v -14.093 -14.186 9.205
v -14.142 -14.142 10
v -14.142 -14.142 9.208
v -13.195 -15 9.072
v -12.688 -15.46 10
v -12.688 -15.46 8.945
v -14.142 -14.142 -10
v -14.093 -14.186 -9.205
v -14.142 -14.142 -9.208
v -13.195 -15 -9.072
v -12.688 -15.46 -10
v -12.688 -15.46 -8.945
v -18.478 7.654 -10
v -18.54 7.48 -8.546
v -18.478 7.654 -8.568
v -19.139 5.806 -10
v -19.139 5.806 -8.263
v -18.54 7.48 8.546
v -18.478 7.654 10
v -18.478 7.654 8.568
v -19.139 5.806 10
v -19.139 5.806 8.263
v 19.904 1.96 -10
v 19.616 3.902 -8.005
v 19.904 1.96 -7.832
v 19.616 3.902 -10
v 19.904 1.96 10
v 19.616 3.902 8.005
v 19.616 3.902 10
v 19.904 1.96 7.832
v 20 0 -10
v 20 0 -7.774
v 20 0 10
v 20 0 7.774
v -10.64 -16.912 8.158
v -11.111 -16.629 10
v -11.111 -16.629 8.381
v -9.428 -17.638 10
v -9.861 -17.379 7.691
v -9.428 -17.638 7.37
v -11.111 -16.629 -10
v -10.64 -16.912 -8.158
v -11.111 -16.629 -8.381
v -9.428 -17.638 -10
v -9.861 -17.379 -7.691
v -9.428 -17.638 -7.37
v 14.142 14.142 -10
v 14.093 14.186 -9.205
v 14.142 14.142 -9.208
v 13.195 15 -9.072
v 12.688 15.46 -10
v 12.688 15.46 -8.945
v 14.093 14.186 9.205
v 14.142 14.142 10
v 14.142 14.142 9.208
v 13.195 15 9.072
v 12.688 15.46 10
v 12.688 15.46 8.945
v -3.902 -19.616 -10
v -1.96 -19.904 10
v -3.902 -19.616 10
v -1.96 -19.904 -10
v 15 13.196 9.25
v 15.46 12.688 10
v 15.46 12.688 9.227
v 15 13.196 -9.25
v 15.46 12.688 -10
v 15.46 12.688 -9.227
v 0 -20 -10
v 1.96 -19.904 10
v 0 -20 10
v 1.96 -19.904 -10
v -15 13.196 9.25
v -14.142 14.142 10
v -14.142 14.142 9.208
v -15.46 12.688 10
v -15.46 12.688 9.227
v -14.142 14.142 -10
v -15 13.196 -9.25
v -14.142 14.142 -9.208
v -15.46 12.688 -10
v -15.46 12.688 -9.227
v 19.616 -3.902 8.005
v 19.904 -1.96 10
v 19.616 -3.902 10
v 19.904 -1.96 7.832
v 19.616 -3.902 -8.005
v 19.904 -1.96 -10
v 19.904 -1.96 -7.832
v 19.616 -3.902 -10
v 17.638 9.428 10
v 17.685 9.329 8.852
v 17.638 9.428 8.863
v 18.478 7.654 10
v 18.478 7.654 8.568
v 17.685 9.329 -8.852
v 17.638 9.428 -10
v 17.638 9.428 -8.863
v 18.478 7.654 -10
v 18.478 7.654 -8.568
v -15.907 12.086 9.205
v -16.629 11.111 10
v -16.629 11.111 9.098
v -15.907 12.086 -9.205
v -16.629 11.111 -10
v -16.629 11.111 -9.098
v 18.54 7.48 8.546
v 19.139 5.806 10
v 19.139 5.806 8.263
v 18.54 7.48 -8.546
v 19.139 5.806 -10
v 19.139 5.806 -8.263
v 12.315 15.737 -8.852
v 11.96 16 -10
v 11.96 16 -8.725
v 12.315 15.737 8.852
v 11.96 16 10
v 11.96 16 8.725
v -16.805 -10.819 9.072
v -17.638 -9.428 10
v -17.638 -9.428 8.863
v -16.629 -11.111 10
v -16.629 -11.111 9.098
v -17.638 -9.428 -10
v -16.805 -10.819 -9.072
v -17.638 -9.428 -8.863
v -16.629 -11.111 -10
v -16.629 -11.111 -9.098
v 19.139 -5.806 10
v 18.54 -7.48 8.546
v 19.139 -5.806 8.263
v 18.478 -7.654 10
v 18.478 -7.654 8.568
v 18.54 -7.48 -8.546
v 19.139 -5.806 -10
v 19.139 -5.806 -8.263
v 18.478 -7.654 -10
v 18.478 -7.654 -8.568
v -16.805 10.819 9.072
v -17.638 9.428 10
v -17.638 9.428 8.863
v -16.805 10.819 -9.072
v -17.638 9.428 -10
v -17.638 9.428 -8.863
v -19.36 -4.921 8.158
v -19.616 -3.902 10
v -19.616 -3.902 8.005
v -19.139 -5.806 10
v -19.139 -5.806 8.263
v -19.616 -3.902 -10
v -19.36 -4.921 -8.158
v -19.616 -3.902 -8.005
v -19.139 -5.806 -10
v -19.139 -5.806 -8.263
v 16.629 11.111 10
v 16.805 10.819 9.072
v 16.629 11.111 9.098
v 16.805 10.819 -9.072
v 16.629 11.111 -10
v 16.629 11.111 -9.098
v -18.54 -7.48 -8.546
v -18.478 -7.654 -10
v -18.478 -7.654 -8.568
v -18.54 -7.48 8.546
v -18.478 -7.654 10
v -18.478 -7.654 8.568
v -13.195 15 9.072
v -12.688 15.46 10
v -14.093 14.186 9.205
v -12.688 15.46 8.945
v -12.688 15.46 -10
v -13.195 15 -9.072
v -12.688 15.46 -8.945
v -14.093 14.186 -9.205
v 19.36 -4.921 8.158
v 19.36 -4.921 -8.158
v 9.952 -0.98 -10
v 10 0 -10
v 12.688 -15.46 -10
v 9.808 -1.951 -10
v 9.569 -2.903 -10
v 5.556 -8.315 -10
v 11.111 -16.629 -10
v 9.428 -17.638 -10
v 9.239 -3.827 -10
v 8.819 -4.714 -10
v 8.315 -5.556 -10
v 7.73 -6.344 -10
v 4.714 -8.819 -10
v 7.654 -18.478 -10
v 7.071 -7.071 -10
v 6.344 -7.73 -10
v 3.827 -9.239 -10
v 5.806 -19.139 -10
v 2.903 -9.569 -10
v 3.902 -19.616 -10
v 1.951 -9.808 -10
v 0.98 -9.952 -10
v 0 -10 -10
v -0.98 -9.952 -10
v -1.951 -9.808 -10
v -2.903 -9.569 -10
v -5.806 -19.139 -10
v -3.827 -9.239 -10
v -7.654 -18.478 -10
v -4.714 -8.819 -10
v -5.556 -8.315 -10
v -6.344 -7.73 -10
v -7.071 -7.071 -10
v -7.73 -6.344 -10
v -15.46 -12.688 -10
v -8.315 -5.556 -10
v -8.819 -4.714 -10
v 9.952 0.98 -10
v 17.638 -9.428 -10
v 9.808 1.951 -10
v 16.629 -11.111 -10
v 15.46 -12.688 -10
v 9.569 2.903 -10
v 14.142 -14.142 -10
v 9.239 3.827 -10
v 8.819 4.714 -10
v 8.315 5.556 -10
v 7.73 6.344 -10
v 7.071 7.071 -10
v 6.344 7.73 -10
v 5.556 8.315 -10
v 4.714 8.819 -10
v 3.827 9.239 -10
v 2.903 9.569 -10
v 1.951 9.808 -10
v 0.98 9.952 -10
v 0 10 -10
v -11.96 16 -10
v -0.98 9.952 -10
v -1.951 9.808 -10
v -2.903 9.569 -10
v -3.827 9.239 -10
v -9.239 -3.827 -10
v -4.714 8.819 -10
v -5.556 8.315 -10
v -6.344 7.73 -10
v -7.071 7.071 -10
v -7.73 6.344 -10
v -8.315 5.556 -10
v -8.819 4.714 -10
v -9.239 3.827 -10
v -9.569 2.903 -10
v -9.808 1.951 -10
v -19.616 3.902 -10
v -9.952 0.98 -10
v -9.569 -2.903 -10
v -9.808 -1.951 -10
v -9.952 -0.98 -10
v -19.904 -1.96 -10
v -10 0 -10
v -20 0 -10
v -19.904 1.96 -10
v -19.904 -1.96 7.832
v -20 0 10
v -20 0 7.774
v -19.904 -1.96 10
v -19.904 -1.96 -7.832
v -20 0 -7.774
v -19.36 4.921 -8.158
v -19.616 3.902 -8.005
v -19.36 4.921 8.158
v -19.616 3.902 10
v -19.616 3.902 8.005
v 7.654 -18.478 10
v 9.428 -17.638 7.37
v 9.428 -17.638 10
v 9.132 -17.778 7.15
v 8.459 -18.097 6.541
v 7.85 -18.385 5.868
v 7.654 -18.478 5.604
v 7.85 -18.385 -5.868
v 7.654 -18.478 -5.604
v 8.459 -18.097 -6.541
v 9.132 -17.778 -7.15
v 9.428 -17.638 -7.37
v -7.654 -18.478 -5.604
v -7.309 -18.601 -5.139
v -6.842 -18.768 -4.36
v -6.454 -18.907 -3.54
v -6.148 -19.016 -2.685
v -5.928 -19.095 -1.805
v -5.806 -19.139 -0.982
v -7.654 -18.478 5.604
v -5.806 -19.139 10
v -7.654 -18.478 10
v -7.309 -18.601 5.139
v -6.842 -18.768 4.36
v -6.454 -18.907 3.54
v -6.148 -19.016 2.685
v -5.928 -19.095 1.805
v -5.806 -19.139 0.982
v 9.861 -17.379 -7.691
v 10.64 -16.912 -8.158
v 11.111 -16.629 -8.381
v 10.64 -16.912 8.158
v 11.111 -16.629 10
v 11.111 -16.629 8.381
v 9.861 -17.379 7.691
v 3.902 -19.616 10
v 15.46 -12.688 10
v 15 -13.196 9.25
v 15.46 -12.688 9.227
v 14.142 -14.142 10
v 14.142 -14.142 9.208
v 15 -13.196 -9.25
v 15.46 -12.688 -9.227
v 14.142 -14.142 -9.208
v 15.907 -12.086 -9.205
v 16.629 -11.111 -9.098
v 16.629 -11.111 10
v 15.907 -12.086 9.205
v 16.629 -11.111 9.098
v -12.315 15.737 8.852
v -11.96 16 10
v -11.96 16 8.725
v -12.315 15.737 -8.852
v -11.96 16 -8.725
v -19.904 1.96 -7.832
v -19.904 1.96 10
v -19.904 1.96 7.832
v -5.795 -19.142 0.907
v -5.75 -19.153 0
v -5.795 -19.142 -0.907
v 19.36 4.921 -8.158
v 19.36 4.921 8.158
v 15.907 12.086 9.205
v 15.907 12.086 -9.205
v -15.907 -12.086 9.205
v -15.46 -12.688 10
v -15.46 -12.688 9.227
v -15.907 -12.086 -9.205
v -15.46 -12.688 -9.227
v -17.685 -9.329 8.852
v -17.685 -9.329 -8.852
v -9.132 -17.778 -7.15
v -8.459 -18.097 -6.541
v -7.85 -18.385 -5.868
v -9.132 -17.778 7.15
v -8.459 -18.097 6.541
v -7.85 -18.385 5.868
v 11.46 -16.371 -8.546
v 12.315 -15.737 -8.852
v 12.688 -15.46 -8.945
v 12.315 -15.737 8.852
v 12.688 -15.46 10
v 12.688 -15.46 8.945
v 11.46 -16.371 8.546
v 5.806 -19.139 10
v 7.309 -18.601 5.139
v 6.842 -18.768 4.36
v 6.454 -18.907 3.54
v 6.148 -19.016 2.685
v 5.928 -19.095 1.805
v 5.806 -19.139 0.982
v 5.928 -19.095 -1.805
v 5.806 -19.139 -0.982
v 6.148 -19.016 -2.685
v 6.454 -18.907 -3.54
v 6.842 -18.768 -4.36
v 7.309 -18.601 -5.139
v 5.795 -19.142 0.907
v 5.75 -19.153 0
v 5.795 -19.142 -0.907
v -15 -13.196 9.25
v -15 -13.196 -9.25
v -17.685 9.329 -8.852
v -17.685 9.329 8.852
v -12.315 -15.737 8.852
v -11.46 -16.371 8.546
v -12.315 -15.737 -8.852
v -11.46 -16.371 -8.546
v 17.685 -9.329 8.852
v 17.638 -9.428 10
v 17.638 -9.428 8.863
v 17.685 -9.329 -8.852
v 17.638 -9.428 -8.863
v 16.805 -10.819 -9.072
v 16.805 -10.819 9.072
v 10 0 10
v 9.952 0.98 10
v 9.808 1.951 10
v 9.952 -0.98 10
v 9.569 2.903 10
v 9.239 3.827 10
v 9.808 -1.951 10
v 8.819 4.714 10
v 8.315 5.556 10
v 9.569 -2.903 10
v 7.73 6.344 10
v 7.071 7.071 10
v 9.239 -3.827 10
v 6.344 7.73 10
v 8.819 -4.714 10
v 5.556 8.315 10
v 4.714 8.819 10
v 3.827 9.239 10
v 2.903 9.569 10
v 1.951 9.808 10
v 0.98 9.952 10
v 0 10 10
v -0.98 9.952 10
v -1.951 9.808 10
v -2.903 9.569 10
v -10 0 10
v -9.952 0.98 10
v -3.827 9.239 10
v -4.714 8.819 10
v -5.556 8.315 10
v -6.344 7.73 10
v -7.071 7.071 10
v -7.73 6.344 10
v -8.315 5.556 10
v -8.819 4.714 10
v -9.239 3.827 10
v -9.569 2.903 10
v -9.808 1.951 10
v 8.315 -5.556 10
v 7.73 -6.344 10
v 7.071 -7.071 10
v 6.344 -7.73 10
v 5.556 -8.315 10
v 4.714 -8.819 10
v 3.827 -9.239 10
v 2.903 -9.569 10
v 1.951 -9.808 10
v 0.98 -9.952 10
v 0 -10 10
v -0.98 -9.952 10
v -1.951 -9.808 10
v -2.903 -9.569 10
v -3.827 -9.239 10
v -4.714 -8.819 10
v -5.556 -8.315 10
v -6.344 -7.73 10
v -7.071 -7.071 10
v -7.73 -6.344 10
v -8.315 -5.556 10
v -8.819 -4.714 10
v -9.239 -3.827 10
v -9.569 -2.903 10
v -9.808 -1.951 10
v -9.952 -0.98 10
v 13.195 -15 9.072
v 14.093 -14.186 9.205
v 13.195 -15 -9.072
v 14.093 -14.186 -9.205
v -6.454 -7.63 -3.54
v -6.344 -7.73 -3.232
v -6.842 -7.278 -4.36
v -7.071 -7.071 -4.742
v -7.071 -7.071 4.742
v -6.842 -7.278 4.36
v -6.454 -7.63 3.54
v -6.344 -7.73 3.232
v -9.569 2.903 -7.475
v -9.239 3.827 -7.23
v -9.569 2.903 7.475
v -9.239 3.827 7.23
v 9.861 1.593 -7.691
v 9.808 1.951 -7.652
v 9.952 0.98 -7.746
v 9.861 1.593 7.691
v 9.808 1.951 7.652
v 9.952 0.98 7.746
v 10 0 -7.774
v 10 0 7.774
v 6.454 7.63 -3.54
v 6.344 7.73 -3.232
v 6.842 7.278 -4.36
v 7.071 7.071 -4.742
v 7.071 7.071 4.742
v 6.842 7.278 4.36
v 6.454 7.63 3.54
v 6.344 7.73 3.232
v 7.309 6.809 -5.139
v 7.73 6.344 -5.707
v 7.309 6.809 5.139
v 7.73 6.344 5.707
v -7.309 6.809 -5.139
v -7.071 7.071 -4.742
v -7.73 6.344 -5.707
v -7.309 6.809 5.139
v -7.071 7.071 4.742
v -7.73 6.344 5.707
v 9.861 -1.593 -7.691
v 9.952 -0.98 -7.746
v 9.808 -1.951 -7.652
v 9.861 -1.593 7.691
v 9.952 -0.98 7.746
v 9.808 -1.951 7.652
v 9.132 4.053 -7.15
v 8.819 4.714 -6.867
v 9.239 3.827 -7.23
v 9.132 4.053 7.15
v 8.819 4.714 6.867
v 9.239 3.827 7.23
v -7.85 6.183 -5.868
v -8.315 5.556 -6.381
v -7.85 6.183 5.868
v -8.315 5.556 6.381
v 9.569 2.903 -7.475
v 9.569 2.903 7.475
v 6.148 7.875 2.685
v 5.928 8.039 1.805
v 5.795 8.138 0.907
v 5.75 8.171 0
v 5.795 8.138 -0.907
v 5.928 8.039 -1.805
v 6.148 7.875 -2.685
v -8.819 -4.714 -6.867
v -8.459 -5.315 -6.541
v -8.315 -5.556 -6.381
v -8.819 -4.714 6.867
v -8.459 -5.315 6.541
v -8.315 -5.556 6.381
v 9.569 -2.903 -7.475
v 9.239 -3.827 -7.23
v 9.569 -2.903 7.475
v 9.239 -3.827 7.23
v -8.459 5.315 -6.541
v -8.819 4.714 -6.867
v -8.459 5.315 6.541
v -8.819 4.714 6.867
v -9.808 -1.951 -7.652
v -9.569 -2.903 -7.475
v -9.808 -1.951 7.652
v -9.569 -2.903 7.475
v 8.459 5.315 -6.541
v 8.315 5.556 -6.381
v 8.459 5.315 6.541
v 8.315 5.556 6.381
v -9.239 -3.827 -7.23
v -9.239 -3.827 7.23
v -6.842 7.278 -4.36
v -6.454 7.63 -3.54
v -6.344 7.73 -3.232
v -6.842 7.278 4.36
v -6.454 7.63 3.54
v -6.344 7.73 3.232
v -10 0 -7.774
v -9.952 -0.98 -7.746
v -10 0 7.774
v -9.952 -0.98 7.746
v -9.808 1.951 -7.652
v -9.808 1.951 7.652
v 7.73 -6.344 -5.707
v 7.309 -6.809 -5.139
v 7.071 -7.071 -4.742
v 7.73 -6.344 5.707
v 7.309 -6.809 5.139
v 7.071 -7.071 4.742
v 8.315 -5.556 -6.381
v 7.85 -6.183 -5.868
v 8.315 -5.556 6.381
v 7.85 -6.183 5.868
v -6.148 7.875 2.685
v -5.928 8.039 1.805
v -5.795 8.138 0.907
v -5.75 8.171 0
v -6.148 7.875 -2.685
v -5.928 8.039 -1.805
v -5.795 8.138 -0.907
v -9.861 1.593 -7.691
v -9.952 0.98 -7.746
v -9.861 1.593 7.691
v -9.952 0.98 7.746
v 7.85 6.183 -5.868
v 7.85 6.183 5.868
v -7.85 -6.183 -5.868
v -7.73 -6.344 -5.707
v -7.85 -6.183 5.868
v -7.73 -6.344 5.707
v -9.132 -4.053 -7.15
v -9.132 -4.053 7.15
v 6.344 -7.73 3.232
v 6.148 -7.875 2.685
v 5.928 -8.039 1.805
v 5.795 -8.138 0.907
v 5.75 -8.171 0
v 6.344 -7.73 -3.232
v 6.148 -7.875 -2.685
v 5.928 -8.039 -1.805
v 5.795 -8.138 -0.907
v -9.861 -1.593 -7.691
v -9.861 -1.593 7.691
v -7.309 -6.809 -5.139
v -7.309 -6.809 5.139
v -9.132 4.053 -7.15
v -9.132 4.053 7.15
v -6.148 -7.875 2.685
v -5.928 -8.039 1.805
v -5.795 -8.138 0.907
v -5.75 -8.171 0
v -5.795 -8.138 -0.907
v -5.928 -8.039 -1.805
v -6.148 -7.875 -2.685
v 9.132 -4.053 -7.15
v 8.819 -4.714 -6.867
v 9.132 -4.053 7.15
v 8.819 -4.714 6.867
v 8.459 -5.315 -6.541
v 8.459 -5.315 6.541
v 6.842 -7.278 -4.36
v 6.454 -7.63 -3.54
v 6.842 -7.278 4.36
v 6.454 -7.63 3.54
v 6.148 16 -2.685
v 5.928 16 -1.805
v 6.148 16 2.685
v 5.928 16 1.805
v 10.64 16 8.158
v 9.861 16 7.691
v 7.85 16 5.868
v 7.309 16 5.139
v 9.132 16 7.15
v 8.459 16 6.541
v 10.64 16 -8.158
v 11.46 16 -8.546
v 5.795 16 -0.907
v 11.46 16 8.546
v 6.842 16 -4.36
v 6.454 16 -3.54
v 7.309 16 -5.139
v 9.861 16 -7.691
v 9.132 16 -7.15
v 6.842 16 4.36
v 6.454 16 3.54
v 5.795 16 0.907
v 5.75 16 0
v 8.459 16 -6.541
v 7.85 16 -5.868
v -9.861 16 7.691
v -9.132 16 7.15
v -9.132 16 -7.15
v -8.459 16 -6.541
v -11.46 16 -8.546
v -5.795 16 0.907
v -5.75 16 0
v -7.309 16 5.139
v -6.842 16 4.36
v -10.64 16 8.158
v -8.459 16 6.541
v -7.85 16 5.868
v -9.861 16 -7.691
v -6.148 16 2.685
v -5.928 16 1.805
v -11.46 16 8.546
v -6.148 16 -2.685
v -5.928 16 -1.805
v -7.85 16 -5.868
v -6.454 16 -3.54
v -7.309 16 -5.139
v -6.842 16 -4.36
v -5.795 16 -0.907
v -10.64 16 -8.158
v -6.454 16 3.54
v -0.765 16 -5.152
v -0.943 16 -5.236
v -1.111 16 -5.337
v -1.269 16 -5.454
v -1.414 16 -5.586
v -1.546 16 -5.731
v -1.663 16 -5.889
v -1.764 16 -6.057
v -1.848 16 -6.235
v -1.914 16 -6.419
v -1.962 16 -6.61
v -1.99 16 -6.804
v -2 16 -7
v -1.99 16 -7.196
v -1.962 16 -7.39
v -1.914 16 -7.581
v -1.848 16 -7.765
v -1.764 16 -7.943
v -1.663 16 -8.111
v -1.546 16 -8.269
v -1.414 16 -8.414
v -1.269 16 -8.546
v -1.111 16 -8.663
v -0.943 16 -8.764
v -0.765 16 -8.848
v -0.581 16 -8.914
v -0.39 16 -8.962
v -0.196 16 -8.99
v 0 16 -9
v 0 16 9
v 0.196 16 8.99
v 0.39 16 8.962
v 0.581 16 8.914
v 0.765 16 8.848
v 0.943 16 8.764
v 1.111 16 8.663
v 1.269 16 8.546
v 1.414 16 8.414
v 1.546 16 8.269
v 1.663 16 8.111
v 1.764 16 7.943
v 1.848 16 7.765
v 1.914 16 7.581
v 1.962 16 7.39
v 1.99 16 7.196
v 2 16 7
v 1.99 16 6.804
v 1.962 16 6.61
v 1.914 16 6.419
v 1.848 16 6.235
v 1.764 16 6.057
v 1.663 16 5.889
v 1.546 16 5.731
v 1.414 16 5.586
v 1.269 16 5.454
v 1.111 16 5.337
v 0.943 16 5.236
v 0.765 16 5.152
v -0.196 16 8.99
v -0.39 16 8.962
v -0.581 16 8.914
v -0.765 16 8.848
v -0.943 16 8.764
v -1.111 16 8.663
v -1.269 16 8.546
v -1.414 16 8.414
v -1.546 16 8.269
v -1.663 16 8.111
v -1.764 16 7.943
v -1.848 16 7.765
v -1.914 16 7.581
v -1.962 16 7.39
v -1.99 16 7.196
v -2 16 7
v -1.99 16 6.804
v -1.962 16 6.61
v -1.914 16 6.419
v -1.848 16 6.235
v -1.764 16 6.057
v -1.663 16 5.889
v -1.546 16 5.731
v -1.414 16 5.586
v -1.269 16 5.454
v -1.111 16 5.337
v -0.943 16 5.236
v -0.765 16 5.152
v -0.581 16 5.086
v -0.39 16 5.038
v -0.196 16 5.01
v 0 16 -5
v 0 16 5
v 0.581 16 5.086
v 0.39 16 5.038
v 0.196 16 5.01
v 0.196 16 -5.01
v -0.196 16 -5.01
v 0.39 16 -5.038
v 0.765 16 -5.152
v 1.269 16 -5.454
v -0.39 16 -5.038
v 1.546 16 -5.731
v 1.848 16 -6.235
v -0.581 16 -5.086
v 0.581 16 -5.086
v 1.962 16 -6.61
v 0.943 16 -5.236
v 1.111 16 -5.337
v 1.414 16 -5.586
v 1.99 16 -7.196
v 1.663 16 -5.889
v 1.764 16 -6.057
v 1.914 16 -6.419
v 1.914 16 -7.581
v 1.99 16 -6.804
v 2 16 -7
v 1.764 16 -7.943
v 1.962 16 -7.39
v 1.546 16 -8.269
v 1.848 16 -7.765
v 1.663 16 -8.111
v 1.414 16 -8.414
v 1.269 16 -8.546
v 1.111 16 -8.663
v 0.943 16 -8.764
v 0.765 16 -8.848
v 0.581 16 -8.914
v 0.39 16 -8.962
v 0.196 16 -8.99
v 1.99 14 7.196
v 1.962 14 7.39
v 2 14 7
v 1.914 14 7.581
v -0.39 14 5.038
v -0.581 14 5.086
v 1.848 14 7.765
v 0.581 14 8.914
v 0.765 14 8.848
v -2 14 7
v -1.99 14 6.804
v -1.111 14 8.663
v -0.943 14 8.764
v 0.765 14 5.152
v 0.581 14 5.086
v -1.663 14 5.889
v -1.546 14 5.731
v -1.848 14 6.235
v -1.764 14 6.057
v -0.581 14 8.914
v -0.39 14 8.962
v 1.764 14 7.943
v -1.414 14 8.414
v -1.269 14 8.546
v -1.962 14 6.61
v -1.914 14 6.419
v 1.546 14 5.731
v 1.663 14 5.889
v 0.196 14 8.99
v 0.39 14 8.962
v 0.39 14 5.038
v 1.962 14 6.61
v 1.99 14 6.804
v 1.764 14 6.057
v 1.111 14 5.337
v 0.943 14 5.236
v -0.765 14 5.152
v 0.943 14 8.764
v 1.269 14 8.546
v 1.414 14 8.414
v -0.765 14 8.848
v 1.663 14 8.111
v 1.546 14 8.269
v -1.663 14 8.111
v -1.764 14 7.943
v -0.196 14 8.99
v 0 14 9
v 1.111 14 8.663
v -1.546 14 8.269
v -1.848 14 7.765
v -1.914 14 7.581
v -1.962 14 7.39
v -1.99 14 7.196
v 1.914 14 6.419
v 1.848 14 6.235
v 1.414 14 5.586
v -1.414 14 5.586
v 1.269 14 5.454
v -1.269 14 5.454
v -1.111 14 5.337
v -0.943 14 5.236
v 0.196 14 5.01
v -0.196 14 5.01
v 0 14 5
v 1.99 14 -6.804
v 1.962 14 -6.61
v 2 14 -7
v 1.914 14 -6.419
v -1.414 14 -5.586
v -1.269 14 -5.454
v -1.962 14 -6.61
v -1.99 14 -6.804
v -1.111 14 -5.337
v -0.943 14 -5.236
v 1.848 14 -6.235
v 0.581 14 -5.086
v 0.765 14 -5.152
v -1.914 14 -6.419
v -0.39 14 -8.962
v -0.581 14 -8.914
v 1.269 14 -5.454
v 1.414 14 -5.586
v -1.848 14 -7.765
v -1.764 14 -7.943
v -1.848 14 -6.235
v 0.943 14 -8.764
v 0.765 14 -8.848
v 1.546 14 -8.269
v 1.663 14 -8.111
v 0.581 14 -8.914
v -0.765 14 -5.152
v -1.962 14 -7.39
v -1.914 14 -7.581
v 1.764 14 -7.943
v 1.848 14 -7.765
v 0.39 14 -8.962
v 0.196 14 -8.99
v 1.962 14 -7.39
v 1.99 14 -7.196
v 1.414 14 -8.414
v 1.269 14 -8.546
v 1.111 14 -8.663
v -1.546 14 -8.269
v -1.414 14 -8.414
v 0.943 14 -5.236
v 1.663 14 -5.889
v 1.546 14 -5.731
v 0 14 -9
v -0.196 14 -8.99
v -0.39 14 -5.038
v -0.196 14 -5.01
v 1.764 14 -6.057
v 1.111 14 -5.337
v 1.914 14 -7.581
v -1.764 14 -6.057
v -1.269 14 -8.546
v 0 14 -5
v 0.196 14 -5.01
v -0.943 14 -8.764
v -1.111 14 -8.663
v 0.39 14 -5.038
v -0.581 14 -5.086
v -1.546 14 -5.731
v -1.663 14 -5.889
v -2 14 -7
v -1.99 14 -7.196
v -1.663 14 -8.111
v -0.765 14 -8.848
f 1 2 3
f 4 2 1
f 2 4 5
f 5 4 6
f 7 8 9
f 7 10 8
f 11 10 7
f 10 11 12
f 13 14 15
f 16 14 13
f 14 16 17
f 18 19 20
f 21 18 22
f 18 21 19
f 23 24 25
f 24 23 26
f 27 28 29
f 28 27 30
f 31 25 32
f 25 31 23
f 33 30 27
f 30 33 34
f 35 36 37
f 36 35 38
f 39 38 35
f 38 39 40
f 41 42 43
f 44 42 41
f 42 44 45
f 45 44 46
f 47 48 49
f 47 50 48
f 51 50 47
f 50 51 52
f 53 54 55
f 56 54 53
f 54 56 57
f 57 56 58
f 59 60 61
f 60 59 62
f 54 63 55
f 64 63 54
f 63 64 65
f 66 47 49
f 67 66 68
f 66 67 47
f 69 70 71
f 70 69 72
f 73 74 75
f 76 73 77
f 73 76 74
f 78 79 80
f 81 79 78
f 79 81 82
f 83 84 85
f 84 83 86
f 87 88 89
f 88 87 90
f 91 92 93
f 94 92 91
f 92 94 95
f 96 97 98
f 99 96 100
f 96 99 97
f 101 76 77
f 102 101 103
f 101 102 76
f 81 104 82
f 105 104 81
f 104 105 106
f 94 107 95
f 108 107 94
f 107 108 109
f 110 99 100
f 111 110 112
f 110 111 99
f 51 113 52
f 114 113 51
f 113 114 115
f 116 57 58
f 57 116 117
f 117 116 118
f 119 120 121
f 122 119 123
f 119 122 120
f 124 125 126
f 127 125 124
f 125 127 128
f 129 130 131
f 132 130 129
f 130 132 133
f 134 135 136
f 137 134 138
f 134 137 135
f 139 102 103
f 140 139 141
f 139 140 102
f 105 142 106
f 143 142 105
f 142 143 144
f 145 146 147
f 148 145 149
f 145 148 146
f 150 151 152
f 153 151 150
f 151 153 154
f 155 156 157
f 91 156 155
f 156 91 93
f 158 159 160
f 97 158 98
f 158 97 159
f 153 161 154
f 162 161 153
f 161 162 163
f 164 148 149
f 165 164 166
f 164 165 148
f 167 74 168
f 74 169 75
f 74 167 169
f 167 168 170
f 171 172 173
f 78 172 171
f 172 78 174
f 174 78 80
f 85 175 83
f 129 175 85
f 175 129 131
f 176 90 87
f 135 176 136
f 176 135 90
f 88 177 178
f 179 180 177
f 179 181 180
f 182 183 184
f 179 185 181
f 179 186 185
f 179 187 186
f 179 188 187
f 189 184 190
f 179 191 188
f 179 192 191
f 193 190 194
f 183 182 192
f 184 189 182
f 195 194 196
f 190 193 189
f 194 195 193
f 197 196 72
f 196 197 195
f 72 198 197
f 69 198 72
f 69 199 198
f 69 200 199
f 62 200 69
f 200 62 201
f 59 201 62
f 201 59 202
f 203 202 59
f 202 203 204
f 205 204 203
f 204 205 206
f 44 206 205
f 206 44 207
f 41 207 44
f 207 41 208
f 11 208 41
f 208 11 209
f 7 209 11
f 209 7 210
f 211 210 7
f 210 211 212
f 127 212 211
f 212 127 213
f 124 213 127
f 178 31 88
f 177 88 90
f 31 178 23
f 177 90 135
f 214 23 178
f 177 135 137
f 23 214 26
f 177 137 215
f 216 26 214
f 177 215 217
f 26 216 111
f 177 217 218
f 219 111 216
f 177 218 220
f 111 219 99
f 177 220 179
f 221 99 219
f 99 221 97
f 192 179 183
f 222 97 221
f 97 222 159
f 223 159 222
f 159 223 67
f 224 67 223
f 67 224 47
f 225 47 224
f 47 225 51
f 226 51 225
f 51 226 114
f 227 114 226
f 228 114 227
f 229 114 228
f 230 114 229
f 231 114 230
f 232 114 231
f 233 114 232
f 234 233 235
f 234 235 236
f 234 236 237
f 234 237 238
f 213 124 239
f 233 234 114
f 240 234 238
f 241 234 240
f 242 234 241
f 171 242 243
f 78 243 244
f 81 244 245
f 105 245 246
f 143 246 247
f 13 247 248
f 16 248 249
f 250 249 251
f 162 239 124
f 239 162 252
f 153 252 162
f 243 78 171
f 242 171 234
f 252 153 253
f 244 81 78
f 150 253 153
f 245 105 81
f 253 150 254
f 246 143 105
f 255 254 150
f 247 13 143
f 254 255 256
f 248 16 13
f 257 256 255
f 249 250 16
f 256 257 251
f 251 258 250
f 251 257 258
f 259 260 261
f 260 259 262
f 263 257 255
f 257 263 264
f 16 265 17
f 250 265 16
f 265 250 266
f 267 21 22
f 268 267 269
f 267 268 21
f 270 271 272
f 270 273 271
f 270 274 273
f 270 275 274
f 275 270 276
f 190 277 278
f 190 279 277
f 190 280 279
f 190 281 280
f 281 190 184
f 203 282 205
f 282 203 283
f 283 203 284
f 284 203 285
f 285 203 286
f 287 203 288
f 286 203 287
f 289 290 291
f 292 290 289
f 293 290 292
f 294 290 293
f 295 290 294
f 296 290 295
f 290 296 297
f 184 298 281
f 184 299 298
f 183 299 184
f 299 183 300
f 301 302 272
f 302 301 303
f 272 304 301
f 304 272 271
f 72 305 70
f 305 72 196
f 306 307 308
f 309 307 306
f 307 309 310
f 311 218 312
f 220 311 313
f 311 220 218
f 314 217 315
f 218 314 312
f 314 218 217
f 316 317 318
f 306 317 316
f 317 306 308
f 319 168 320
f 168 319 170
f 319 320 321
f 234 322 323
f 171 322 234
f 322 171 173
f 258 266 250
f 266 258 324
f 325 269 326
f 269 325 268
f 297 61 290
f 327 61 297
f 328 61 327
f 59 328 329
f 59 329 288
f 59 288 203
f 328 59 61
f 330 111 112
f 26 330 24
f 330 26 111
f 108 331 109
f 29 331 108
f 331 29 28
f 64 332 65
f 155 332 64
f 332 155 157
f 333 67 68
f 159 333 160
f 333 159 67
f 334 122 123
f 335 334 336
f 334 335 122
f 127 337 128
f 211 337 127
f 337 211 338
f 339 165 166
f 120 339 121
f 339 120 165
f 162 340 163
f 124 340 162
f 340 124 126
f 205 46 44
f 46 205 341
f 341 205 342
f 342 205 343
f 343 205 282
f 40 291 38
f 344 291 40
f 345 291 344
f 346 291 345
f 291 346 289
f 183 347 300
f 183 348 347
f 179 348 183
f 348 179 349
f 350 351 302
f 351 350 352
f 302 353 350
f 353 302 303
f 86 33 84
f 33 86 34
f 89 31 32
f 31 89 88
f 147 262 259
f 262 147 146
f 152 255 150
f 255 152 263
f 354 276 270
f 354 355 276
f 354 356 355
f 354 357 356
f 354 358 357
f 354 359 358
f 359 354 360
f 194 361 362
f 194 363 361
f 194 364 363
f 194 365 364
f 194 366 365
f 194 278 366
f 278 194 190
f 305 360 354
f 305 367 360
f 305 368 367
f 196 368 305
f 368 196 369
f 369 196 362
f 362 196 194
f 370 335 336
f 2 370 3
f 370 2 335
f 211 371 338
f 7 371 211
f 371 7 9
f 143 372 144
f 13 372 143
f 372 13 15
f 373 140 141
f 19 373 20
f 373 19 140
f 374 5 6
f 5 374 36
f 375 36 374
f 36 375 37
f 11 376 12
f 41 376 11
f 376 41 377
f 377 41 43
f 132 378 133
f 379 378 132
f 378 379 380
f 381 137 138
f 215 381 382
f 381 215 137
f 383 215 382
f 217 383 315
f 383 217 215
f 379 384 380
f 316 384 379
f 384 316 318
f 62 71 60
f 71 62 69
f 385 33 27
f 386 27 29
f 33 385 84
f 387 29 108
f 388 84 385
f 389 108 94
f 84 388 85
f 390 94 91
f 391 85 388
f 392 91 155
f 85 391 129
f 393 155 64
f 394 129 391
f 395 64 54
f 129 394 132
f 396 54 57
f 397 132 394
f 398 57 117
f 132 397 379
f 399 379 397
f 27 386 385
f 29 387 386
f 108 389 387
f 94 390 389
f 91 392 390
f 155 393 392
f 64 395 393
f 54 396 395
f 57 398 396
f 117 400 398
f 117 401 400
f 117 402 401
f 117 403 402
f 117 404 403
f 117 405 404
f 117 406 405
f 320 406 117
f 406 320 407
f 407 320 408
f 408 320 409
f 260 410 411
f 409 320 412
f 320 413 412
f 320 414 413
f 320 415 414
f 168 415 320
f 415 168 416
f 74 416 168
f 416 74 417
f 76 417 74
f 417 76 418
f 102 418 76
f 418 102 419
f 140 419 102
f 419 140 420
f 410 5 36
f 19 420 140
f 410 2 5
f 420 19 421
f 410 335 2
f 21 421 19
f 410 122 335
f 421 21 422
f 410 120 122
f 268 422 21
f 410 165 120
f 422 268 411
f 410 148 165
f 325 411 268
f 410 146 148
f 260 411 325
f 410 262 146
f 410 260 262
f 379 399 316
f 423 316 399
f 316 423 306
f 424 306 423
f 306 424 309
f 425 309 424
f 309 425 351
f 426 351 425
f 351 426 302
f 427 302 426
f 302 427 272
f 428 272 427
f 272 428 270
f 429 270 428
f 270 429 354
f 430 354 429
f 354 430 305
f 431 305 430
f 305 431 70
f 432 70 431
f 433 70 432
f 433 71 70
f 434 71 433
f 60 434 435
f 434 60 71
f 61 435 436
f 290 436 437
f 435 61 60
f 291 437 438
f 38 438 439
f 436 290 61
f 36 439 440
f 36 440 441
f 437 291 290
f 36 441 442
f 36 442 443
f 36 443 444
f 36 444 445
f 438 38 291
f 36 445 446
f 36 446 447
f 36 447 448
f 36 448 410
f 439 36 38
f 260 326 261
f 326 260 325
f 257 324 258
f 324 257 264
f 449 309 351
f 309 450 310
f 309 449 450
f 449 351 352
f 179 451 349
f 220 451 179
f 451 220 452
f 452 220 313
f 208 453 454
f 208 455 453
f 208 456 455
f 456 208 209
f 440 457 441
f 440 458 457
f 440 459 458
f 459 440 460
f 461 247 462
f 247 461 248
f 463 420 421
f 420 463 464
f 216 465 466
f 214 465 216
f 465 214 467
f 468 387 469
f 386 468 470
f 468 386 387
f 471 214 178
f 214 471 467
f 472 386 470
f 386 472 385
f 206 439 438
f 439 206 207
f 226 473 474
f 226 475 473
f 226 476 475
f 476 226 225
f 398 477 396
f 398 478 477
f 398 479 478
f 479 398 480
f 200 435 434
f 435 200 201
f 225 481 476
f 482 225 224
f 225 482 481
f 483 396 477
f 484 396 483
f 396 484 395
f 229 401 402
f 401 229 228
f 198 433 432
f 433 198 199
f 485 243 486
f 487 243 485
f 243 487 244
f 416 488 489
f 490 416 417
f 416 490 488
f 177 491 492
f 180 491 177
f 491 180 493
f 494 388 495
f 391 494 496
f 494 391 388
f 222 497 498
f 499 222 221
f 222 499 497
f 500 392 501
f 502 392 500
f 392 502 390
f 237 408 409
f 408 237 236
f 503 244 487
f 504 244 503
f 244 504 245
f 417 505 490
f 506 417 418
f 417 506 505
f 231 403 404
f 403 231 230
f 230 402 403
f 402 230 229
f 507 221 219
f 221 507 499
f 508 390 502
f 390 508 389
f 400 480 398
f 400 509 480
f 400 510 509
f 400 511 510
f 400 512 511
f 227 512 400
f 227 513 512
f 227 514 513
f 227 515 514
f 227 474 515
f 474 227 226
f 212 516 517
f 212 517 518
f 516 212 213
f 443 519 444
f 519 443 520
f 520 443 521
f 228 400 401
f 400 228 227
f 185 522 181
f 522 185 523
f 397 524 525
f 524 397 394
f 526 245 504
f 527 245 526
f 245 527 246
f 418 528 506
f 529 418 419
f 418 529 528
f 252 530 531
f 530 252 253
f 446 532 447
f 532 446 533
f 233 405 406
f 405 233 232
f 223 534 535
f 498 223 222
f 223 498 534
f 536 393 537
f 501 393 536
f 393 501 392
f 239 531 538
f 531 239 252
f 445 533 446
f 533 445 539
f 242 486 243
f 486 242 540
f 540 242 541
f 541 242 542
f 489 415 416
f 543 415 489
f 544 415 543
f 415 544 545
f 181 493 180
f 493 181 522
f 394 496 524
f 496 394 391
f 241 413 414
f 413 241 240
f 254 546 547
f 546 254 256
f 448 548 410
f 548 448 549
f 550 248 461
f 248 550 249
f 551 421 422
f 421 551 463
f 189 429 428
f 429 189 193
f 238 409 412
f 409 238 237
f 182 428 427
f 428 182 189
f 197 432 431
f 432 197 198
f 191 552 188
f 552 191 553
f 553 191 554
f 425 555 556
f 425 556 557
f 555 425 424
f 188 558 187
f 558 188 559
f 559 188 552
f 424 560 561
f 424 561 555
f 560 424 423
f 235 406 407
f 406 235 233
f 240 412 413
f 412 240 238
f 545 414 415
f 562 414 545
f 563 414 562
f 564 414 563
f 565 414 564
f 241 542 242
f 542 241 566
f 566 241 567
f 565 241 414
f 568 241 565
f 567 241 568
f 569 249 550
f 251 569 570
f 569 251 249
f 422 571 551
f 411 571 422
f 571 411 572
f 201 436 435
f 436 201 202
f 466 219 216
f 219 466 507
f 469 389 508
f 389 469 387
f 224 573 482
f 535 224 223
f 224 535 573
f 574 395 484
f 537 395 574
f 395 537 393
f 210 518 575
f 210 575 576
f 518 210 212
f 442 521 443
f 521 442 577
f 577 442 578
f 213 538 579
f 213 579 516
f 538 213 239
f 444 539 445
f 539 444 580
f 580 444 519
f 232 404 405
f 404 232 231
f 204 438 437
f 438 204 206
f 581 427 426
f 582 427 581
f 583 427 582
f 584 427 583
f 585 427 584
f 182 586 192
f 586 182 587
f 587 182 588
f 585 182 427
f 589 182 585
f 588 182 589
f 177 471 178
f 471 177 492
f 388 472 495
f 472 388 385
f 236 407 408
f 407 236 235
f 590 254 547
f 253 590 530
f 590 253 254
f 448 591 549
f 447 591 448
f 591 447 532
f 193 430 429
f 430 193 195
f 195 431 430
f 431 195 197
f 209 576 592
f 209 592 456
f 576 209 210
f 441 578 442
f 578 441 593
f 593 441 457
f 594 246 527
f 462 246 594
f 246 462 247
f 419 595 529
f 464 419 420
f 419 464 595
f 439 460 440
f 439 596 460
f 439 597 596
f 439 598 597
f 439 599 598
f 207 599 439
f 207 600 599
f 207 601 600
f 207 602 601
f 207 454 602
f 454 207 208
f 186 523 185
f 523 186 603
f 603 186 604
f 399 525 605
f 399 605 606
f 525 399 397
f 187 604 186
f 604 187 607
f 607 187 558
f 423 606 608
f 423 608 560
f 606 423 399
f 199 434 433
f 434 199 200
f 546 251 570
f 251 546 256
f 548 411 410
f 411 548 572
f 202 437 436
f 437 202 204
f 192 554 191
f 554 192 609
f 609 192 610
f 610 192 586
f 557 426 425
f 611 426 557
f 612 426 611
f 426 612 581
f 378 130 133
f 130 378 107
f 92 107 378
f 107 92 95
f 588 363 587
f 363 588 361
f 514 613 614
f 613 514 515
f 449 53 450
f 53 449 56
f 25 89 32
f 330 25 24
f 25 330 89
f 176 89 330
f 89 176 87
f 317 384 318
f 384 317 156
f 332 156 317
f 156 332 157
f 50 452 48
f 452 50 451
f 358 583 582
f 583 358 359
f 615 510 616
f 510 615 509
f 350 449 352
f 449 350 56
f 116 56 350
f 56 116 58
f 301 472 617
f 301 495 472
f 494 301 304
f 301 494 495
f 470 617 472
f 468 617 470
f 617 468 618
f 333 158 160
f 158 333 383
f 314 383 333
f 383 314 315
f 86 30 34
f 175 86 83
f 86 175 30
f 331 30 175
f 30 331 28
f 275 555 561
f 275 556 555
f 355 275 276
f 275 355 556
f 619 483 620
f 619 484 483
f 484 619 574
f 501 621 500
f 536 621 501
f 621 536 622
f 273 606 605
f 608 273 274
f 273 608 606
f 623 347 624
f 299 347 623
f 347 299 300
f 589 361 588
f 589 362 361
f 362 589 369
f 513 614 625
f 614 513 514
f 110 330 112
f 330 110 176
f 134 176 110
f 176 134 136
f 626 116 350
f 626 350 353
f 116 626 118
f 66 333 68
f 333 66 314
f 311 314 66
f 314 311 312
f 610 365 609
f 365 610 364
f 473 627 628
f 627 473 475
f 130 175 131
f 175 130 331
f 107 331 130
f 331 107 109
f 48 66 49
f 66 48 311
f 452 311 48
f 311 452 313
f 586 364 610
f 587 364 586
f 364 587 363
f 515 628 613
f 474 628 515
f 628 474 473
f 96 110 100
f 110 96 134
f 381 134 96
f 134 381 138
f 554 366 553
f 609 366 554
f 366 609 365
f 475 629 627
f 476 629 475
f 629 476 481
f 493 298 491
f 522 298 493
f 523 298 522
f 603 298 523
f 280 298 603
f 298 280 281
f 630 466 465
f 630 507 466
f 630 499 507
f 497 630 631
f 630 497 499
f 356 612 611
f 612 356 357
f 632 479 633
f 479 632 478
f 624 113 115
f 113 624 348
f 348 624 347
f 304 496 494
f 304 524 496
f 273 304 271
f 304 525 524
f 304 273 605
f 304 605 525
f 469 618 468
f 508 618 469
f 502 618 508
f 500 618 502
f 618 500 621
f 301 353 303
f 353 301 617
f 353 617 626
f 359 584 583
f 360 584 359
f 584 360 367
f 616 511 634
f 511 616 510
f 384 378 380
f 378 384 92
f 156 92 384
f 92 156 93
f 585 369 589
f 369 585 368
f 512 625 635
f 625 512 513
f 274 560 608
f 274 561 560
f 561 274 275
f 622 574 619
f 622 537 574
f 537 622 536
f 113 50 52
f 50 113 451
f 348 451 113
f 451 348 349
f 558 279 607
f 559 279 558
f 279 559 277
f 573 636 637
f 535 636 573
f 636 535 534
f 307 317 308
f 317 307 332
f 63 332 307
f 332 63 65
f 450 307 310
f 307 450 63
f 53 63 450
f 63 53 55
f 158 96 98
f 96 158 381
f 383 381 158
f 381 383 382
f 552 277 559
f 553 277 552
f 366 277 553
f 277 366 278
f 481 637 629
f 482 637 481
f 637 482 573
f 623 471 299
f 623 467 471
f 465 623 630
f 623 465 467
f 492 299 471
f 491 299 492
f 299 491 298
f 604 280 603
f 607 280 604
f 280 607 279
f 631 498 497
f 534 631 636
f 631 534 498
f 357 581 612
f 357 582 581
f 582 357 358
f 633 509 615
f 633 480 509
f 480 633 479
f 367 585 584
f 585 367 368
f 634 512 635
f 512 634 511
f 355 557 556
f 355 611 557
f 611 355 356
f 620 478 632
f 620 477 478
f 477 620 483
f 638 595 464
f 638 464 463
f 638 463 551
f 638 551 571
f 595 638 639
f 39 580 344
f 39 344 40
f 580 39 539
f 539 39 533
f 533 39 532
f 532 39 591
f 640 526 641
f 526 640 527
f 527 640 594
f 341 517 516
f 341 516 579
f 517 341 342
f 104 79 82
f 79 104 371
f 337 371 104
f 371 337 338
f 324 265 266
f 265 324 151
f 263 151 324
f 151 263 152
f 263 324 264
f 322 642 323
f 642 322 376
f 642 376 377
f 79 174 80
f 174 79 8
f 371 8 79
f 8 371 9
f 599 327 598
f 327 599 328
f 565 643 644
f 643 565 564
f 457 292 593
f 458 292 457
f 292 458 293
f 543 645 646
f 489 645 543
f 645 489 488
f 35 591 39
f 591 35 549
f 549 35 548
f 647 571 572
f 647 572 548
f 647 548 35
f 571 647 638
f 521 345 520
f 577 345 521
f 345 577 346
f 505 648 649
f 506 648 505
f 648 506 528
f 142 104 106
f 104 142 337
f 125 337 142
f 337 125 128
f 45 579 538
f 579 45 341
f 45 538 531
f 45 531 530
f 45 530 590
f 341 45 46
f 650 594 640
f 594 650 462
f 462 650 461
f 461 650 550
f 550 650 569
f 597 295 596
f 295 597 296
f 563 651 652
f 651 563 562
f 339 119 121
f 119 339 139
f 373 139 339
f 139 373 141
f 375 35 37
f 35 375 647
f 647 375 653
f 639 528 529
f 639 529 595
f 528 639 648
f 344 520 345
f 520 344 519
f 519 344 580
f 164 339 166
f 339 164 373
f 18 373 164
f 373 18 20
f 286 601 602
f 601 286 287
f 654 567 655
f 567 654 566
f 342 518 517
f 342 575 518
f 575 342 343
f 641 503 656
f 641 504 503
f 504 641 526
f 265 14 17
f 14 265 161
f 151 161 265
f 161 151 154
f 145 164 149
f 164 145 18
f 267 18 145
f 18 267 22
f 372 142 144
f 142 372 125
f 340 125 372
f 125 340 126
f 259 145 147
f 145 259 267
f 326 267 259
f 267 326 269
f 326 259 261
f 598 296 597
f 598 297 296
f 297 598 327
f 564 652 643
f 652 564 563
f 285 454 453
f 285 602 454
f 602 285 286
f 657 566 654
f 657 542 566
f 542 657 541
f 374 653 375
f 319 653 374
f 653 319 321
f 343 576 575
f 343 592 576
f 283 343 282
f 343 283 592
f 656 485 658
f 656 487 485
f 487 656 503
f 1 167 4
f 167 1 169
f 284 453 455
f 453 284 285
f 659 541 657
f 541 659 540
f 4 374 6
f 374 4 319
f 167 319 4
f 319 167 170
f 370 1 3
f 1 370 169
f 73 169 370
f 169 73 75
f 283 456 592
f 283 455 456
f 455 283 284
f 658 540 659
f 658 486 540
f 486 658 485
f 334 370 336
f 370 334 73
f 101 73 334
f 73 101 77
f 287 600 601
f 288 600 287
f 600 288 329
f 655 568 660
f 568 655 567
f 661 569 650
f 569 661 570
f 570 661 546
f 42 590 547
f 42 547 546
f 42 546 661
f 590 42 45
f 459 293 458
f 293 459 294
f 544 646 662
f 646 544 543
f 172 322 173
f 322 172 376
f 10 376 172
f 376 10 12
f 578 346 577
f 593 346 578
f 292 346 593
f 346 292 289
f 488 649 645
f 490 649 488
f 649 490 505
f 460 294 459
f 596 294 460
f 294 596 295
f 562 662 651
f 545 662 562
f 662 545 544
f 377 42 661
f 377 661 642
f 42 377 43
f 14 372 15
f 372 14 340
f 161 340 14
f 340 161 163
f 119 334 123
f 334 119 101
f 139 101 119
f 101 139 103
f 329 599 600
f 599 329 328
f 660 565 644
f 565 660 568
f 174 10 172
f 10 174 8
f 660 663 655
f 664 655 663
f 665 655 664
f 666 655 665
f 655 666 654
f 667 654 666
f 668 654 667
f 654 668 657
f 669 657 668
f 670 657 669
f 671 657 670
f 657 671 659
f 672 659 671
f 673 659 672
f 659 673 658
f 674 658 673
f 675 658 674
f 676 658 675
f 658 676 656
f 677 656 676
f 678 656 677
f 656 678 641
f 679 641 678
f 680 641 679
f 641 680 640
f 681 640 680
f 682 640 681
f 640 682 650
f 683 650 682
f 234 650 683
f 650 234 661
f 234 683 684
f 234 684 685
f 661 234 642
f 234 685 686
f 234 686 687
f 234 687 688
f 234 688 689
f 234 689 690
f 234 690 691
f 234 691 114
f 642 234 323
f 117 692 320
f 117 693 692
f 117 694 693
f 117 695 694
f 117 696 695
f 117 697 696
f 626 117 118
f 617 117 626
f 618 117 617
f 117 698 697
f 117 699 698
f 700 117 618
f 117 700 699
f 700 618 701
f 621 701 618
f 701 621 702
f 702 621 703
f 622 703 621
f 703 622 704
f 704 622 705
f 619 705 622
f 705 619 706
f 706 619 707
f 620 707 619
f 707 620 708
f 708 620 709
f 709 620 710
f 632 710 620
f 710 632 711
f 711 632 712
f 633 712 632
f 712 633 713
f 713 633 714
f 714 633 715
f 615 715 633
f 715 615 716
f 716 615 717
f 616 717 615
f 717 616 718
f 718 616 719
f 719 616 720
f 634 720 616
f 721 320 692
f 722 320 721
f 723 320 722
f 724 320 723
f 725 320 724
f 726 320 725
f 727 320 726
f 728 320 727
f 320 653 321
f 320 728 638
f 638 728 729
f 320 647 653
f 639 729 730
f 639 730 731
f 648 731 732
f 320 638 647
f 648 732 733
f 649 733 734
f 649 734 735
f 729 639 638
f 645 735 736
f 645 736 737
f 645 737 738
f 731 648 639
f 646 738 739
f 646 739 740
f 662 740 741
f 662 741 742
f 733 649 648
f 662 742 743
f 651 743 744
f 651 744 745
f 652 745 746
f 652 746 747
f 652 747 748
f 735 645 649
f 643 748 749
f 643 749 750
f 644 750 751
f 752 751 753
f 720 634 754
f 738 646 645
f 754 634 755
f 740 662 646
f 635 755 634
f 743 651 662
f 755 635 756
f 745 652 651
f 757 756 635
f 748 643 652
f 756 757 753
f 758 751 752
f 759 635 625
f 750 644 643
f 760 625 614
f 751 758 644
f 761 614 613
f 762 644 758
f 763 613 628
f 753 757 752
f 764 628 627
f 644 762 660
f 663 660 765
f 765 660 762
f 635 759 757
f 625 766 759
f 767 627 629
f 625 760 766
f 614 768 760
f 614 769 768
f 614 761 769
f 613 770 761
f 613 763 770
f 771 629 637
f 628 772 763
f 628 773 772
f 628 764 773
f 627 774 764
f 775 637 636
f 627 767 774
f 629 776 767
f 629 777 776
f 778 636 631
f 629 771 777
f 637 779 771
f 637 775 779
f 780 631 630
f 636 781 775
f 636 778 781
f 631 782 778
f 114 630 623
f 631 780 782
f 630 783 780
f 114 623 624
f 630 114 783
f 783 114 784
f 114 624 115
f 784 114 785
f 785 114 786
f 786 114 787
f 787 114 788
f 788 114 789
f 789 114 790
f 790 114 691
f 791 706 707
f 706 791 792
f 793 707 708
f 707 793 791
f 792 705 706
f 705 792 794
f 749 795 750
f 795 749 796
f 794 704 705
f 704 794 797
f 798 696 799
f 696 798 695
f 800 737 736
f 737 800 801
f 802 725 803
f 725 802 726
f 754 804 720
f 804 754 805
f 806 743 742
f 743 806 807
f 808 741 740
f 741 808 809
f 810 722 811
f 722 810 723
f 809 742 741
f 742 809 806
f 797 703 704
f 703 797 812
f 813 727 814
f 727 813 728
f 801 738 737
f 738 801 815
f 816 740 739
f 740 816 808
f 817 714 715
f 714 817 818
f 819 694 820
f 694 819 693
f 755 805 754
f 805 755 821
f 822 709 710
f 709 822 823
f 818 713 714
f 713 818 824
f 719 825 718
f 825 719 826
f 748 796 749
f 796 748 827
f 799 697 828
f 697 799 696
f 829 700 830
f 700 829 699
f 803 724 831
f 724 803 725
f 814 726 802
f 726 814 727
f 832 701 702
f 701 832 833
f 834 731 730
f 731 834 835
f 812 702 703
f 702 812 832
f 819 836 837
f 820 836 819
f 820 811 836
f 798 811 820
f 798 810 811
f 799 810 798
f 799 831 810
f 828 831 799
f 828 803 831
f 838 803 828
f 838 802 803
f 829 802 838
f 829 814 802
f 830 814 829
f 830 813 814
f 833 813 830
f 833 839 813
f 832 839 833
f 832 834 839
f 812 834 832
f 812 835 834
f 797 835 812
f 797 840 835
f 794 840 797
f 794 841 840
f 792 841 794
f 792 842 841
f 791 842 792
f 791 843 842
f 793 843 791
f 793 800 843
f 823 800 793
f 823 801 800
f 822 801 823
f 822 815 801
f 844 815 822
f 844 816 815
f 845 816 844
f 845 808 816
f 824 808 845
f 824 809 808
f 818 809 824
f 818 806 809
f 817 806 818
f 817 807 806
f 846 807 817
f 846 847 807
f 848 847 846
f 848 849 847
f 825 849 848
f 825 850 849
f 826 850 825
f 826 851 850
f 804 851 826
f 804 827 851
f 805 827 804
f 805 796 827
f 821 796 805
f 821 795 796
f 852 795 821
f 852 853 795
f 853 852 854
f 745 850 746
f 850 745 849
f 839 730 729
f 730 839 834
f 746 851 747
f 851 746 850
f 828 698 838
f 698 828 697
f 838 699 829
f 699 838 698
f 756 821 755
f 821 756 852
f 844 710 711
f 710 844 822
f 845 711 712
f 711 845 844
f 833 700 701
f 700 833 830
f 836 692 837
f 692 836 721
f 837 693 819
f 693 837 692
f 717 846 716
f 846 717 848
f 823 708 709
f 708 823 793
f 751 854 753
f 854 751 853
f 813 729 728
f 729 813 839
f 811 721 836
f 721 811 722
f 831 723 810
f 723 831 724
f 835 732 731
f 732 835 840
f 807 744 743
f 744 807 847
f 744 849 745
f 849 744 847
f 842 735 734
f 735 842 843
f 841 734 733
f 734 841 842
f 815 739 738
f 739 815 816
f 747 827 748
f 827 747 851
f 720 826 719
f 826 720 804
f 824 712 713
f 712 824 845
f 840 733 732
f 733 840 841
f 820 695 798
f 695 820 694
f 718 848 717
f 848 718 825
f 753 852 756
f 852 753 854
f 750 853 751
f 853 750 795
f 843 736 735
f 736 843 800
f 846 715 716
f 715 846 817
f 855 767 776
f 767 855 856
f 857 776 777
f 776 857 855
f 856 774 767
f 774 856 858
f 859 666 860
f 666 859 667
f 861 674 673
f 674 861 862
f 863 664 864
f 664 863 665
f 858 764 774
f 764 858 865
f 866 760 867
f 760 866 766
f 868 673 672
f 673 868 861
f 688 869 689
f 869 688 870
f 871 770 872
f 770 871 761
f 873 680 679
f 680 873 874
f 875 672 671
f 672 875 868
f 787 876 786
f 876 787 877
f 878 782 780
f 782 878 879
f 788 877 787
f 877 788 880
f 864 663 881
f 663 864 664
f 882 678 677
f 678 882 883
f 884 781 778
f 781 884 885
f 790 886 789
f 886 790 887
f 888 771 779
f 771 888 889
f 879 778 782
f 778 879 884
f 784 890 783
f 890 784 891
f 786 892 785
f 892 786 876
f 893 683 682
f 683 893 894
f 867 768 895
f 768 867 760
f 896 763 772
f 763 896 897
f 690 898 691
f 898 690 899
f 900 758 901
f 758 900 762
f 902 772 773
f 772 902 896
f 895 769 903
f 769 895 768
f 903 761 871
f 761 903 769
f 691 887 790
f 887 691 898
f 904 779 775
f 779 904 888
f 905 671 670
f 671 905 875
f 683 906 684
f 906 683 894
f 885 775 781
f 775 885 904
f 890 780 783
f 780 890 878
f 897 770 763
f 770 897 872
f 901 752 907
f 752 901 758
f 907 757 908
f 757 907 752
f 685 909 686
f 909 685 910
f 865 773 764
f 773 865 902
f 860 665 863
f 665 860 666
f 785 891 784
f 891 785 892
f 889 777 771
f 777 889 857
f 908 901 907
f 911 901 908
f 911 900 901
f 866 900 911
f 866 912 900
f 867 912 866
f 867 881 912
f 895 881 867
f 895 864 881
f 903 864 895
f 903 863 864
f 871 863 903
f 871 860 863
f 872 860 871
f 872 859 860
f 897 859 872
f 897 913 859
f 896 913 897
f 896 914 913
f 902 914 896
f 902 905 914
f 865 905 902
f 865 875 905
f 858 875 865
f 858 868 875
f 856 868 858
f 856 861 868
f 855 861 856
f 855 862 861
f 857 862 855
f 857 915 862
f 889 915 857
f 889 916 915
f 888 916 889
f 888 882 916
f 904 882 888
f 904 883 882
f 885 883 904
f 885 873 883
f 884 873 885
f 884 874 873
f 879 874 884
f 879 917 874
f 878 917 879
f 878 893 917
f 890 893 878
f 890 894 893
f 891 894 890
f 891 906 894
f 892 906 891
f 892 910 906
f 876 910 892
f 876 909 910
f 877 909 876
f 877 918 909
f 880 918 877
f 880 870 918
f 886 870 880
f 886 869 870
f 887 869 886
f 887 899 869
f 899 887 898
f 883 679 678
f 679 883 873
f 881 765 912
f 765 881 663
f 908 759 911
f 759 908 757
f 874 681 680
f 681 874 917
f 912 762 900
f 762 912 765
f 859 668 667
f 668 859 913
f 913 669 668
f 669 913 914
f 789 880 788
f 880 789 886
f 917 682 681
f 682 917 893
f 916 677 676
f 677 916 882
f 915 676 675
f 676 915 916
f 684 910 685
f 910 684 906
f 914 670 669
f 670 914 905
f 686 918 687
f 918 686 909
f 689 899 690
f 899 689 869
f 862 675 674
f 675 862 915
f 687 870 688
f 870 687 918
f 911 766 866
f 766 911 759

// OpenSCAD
// COBRA Vertebra - T4 V10
// Height: 20.0mm, OD: 40.0mm

$fn = 64;

difference() {
    // Outer cylinder
    cylinder(h=20.0, d=40.0, center=true);
    
    // Inner channel
    cylinder(h=22.0, d=20.0, center=true);

    // Battery cavity 1
    rotate([0, 0, 0])
    translate([15.0, 0, 0])
    rotate([90, 0, 0])
    cylinder(h=74.0, d=18.5, center=true);

    // Battery cavity 2
    rotate([0, 0, 180])
    translate([15.0, 0, 0])
    rotate([90, 0, 0])
    cylinder(h=74.0, d=18.5, center=true);

    // Solar panel cavity
    translate([0, 18.0, 0])
    cube([50, 4, 30], center=true);

    // Pivot holes
    translate([0, 20.0, 7.0])
    rotate([90, 0, 0])
    cylinder(h=12.0, d=4, center=true);
    
    translate([0, 20.0, -7.0])
    rotate([90, 0, 0])
    cylinder(h=12.0, d=4, center=true);
}
